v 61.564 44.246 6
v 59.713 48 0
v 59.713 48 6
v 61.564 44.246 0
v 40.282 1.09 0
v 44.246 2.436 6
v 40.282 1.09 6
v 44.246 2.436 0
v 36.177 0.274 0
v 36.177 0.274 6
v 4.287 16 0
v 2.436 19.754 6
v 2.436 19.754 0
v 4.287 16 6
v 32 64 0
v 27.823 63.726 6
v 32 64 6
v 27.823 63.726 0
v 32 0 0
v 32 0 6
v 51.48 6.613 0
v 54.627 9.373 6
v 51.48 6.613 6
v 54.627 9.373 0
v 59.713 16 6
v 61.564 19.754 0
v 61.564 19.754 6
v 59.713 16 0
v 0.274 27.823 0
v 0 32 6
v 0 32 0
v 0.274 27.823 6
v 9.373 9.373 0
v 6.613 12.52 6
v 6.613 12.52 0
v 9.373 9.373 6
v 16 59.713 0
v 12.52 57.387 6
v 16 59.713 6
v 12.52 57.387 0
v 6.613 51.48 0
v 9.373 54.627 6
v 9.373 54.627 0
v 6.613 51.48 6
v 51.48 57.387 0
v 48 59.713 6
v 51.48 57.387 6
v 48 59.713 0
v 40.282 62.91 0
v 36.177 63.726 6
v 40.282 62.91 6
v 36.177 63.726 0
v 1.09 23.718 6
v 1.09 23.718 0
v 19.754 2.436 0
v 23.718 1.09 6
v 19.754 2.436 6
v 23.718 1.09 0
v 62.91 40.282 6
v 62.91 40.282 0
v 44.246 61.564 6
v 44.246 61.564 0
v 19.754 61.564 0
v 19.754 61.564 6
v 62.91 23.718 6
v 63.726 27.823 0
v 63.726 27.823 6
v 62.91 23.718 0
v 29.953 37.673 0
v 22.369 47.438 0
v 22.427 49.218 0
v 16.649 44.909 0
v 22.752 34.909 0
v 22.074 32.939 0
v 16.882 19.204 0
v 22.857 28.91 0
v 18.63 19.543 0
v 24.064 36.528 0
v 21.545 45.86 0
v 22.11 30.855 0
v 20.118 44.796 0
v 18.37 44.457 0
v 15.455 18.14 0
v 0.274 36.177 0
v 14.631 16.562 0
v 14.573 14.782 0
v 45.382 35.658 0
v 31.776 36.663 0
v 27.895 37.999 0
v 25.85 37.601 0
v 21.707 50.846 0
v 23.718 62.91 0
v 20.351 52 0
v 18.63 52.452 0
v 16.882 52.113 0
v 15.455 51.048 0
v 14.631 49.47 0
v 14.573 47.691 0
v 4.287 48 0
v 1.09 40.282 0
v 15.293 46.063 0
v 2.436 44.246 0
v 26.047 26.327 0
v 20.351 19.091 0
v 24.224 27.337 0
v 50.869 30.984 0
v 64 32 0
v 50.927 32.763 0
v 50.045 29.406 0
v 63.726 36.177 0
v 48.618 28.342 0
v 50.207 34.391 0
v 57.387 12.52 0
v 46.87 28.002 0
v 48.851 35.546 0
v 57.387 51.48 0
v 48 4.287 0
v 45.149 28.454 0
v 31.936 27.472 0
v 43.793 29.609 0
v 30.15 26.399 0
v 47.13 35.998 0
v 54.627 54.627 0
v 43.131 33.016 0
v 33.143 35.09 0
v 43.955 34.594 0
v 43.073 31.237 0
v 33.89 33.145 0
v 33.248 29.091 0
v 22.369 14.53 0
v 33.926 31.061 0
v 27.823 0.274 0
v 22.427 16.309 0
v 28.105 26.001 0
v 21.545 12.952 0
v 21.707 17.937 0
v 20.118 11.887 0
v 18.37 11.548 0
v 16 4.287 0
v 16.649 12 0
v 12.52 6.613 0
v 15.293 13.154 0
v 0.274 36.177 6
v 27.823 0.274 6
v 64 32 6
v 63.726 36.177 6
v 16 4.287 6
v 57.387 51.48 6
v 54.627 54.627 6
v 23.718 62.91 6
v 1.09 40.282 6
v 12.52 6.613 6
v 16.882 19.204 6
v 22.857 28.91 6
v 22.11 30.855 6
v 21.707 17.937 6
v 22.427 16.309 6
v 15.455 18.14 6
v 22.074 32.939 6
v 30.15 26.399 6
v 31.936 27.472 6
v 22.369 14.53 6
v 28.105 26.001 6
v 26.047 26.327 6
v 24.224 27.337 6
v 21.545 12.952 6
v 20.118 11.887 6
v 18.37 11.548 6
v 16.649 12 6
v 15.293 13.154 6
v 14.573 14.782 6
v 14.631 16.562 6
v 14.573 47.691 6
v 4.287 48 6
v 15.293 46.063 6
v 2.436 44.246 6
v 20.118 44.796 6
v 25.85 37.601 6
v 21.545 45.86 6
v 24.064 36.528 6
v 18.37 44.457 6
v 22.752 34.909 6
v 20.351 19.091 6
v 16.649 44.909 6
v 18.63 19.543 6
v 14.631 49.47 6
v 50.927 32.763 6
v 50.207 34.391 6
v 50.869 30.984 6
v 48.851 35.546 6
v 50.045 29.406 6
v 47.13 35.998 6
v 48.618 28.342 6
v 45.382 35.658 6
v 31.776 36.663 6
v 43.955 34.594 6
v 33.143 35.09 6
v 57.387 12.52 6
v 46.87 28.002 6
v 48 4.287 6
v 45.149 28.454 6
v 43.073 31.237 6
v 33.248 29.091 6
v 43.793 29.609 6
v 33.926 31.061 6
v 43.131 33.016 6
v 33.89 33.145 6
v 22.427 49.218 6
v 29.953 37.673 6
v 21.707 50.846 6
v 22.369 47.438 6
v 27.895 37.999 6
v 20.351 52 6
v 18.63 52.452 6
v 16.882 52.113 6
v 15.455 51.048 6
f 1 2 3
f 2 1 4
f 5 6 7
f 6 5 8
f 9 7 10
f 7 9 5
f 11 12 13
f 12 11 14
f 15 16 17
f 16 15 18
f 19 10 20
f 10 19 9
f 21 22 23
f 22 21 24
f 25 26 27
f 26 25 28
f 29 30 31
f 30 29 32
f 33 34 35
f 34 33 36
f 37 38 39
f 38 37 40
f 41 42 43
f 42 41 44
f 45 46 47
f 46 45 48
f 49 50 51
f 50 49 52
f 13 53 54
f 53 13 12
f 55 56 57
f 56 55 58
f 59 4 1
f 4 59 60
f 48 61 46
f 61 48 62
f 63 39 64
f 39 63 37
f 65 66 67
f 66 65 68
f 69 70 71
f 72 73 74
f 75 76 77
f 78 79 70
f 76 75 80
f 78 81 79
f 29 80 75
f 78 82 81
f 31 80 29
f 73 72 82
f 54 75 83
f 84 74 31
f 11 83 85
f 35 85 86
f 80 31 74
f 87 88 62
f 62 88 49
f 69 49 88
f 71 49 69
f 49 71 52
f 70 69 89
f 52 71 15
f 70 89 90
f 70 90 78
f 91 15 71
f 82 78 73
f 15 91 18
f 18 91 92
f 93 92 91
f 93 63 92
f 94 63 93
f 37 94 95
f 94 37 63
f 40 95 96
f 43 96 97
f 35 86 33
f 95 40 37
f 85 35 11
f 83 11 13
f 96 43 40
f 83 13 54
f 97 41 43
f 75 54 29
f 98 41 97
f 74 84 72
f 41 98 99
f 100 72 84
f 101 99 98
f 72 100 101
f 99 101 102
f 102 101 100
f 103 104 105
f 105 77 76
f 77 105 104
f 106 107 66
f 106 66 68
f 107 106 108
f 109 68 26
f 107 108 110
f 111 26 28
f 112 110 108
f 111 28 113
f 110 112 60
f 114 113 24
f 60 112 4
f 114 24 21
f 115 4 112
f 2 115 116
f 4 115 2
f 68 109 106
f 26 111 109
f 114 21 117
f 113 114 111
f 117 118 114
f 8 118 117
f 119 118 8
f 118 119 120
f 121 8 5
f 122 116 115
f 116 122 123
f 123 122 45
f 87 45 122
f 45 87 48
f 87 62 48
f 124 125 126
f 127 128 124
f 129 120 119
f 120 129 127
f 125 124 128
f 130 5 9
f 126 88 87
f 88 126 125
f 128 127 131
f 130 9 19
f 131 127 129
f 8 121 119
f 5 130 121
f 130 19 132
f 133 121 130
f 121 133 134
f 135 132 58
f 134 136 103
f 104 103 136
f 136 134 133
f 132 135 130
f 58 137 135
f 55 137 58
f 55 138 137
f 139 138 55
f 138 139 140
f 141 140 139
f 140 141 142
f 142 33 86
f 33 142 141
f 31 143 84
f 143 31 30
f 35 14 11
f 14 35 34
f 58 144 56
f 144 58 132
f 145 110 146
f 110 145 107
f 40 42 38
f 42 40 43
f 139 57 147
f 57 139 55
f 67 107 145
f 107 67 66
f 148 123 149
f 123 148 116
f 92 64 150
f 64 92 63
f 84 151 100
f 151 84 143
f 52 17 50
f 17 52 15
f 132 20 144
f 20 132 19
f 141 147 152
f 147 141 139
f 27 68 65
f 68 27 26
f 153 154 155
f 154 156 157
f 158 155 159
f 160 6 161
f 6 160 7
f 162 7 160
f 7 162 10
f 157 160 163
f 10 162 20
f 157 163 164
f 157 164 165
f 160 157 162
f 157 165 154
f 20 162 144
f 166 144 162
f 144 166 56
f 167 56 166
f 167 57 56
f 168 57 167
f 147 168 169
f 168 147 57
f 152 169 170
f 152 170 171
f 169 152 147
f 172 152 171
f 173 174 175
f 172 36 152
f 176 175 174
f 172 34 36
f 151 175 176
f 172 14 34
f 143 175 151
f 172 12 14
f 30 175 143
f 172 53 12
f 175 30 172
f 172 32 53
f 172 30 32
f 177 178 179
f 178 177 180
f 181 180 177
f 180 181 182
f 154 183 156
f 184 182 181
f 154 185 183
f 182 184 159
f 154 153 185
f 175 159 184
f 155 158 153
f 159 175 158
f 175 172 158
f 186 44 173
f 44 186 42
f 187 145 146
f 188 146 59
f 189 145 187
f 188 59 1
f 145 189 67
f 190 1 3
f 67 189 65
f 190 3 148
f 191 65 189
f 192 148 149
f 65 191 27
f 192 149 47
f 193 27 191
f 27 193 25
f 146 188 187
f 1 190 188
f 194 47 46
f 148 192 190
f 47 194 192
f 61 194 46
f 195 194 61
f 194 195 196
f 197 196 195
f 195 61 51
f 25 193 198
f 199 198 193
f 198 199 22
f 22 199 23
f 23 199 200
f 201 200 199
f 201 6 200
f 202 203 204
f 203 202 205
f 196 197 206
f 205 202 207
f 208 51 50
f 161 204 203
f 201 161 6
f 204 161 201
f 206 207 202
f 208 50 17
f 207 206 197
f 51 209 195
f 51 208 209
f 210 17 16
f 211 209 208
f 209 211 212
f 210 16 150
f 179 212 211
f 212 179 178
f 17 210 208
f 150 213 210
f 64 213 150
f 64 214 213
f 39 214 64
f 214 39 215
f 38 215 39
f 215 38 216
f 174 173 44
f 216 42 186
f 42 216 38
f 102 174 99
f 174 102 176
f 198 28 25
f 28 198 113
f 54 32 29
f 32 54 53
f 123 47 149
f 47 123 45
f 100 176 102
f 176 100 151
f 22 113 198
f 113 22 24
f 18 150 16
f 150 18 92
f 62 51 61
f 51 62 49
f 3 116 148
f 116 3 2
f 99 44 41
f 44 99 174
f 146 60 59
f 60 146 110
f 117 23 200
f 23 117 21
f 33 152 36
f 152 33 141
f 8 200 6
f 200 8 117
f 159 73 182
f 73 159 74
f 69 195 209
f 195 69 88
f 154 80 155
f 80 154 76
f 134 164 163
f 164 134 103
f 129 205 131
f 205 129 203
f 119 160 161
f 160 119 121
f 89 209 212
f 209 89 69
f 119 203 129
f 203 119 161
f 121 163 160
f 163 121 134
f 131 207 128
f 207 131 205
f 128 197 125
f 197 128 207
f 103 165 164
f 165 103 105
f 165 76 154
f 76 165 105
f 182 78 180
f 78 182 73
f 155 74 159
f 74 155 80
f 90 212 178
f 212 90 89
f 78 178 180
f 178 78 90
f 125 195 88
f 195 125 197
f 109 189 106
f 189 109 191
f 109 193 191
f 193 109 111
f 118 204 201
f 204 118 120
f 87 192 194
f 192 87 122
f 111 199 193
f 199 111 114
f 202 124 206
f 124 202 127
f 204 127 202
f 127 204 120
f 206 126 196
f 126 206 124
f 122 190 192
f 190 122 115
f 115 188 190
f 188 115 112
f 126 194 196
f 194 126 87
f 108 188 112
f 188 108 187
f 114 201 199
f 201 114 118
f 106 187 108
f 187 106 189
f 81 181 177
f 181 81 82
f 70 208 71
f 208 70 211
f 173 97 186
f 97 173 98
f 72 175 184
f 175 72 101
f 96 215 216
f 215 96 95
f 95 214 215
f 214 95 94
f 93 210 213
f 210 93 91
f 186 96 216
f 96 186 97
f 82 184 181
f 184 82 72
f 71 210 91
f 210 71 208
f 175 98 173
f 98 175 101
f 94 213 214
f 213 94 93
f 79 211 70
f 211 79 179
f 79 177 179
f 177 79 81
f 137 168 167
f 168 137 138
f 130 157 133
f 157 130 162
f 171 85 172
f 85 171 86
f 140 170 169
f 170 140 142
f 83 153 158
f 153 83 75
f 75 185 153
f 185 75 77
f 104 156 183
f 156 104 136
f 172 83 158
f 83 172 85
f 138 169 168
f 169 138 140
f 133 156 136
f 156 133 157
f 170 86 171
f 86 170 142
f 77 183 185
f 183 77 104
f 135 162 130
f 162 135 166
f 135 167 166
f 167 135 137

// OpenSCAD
$fn = 32;

// ----------------------------------------------------------------------
// Cam plate: eccentric cam, base R32
// ----------------------------------------------------------------------

// --- parameters (mm) ---
base_r = 32;              // base circle radius
lobe_h = 12;              // cam lobe rise
bore_r = 6;               // shaft bore radius
plate_t = 6;              // plate thickness, Z (extrusion height)
ecc = 4;                  // disc eccentricity
ring_r = 19;              // lightening ring radius
bolt_r = 4;               // lightening hole radius

profile = [[64, 32], [63.726, 36.177], [62.91, 40.282], [61.564, 44.246], [59.713, 48], [57.387, 51.48], [54.627, 54.627], [51.48, 57.387], [48, 59.713], [44.246, 61.564], [40.282, 62.91], [36.177, 63.726], [32, 64], [27.823, 63.726], [23.718, 62.91], [19.754, 61.564], [16, 59.713], [12.52, 57.387], [9.373, 54.627], [6.613, 51.48], [4.287, 48], [2.436, 44.246], [1.09, 40.282], [0.274, 36.177], [0, 32], [0.274, 27.823], [1.09, 23.718], [2.436, 19.754], [4.287, 16], [6.613, 12.52], [9.373, 9.373], [12.52, 6.613], [16, 4.287], [19.754, 2.436], [23.718, 1.09], [27.823, 0.274], [32, 0], [36.177, 0.274], [40.282, 1.09], [44.246, 2.436], [48, 4.287], [51.48, 6.613], [54.627, 9.373], [57.387, 12.52], [59.713, 16], [61.564, 19.754], [62.91, 23.718], [63.726, 27.823]];  // primary outline, 48 points, counter clockwise
void_1 = [[33.89, 33.145], [33.143, 35.09], [31.776, 36.663], [29.953, 37.673], [27.895, 37.999], [25.85, 37.601], [24.064, 36.528], [22.752, 34.909], [22.074, 32.939], [22.11, 30.855], [22.857, 28.91], [24.224, 27.337], [26.047, 26.327], [28.105, 26.001], [30.15, 26.399], [31.936, 27.472], [33.248, 29.091], [33.926, 31.061]];  // shaft bore, 18 points
void_2 = [[50.927, 32.763], [50.207, 34.391], [48.851, 35.546], [47.13, 35.998], [45.382, 35.658], [43.955, 34.594], [43.131, 33.016], [43.073, 31.237], [43.793, 29.609], [45.149, 28.454], [46.87, 28.002], [48.618, 28.342], [50.045, 29.406], [50.869, 30.984]];  // lightening hole 1, 14 points
void_3 = [[22.427, 49.218], [21.707, 50.846], [20.351, 52], [18.63, 52.452], [16.882, 52.113], [15.455, 51.048], [14.631, 49.47], [14.573, 47.691], [15.293, 46.063], [16.649, 44.909], [18.37, 44.457], [20.118, 44.796], [21.545, 45.86], [22.369, 47.438]];  // lightening hole 2, 14 points
void_4 = [[22.427, 16.309], [21.707, 17.937], [20.351, 19.091], [18.63, 19.543], [16.882, 19.204], [15.455, 18.14], [14.631, 16.562], [14.573, 14.782], [15.293, 13.154], [16.649, 12], [18.37, 11.548], [20.118, 11.887], [21.545, 12.952], [22.369, 14.53]];  // lightening hole 3, 14 points

// --- the one profile operation ---
difference() {
  linear_extrude(height = plate_t) polygon(points = profile);
  translate([0, 0, -1])
    linear_extrude(height = plate_t + 2) polygon(points = void_1);
  translate([0, 0, -1])
    linear_extrude(height = plate_t + 2) polygon(points = void_2);
  translate([0, 0, -1])
    linear_extrude(height = plate_t + 2) polygon(points = void_3);
  translate([0, 0, -1])
    linear_extrude(height = plate_t + 2) polygon(points = void_4);
}
